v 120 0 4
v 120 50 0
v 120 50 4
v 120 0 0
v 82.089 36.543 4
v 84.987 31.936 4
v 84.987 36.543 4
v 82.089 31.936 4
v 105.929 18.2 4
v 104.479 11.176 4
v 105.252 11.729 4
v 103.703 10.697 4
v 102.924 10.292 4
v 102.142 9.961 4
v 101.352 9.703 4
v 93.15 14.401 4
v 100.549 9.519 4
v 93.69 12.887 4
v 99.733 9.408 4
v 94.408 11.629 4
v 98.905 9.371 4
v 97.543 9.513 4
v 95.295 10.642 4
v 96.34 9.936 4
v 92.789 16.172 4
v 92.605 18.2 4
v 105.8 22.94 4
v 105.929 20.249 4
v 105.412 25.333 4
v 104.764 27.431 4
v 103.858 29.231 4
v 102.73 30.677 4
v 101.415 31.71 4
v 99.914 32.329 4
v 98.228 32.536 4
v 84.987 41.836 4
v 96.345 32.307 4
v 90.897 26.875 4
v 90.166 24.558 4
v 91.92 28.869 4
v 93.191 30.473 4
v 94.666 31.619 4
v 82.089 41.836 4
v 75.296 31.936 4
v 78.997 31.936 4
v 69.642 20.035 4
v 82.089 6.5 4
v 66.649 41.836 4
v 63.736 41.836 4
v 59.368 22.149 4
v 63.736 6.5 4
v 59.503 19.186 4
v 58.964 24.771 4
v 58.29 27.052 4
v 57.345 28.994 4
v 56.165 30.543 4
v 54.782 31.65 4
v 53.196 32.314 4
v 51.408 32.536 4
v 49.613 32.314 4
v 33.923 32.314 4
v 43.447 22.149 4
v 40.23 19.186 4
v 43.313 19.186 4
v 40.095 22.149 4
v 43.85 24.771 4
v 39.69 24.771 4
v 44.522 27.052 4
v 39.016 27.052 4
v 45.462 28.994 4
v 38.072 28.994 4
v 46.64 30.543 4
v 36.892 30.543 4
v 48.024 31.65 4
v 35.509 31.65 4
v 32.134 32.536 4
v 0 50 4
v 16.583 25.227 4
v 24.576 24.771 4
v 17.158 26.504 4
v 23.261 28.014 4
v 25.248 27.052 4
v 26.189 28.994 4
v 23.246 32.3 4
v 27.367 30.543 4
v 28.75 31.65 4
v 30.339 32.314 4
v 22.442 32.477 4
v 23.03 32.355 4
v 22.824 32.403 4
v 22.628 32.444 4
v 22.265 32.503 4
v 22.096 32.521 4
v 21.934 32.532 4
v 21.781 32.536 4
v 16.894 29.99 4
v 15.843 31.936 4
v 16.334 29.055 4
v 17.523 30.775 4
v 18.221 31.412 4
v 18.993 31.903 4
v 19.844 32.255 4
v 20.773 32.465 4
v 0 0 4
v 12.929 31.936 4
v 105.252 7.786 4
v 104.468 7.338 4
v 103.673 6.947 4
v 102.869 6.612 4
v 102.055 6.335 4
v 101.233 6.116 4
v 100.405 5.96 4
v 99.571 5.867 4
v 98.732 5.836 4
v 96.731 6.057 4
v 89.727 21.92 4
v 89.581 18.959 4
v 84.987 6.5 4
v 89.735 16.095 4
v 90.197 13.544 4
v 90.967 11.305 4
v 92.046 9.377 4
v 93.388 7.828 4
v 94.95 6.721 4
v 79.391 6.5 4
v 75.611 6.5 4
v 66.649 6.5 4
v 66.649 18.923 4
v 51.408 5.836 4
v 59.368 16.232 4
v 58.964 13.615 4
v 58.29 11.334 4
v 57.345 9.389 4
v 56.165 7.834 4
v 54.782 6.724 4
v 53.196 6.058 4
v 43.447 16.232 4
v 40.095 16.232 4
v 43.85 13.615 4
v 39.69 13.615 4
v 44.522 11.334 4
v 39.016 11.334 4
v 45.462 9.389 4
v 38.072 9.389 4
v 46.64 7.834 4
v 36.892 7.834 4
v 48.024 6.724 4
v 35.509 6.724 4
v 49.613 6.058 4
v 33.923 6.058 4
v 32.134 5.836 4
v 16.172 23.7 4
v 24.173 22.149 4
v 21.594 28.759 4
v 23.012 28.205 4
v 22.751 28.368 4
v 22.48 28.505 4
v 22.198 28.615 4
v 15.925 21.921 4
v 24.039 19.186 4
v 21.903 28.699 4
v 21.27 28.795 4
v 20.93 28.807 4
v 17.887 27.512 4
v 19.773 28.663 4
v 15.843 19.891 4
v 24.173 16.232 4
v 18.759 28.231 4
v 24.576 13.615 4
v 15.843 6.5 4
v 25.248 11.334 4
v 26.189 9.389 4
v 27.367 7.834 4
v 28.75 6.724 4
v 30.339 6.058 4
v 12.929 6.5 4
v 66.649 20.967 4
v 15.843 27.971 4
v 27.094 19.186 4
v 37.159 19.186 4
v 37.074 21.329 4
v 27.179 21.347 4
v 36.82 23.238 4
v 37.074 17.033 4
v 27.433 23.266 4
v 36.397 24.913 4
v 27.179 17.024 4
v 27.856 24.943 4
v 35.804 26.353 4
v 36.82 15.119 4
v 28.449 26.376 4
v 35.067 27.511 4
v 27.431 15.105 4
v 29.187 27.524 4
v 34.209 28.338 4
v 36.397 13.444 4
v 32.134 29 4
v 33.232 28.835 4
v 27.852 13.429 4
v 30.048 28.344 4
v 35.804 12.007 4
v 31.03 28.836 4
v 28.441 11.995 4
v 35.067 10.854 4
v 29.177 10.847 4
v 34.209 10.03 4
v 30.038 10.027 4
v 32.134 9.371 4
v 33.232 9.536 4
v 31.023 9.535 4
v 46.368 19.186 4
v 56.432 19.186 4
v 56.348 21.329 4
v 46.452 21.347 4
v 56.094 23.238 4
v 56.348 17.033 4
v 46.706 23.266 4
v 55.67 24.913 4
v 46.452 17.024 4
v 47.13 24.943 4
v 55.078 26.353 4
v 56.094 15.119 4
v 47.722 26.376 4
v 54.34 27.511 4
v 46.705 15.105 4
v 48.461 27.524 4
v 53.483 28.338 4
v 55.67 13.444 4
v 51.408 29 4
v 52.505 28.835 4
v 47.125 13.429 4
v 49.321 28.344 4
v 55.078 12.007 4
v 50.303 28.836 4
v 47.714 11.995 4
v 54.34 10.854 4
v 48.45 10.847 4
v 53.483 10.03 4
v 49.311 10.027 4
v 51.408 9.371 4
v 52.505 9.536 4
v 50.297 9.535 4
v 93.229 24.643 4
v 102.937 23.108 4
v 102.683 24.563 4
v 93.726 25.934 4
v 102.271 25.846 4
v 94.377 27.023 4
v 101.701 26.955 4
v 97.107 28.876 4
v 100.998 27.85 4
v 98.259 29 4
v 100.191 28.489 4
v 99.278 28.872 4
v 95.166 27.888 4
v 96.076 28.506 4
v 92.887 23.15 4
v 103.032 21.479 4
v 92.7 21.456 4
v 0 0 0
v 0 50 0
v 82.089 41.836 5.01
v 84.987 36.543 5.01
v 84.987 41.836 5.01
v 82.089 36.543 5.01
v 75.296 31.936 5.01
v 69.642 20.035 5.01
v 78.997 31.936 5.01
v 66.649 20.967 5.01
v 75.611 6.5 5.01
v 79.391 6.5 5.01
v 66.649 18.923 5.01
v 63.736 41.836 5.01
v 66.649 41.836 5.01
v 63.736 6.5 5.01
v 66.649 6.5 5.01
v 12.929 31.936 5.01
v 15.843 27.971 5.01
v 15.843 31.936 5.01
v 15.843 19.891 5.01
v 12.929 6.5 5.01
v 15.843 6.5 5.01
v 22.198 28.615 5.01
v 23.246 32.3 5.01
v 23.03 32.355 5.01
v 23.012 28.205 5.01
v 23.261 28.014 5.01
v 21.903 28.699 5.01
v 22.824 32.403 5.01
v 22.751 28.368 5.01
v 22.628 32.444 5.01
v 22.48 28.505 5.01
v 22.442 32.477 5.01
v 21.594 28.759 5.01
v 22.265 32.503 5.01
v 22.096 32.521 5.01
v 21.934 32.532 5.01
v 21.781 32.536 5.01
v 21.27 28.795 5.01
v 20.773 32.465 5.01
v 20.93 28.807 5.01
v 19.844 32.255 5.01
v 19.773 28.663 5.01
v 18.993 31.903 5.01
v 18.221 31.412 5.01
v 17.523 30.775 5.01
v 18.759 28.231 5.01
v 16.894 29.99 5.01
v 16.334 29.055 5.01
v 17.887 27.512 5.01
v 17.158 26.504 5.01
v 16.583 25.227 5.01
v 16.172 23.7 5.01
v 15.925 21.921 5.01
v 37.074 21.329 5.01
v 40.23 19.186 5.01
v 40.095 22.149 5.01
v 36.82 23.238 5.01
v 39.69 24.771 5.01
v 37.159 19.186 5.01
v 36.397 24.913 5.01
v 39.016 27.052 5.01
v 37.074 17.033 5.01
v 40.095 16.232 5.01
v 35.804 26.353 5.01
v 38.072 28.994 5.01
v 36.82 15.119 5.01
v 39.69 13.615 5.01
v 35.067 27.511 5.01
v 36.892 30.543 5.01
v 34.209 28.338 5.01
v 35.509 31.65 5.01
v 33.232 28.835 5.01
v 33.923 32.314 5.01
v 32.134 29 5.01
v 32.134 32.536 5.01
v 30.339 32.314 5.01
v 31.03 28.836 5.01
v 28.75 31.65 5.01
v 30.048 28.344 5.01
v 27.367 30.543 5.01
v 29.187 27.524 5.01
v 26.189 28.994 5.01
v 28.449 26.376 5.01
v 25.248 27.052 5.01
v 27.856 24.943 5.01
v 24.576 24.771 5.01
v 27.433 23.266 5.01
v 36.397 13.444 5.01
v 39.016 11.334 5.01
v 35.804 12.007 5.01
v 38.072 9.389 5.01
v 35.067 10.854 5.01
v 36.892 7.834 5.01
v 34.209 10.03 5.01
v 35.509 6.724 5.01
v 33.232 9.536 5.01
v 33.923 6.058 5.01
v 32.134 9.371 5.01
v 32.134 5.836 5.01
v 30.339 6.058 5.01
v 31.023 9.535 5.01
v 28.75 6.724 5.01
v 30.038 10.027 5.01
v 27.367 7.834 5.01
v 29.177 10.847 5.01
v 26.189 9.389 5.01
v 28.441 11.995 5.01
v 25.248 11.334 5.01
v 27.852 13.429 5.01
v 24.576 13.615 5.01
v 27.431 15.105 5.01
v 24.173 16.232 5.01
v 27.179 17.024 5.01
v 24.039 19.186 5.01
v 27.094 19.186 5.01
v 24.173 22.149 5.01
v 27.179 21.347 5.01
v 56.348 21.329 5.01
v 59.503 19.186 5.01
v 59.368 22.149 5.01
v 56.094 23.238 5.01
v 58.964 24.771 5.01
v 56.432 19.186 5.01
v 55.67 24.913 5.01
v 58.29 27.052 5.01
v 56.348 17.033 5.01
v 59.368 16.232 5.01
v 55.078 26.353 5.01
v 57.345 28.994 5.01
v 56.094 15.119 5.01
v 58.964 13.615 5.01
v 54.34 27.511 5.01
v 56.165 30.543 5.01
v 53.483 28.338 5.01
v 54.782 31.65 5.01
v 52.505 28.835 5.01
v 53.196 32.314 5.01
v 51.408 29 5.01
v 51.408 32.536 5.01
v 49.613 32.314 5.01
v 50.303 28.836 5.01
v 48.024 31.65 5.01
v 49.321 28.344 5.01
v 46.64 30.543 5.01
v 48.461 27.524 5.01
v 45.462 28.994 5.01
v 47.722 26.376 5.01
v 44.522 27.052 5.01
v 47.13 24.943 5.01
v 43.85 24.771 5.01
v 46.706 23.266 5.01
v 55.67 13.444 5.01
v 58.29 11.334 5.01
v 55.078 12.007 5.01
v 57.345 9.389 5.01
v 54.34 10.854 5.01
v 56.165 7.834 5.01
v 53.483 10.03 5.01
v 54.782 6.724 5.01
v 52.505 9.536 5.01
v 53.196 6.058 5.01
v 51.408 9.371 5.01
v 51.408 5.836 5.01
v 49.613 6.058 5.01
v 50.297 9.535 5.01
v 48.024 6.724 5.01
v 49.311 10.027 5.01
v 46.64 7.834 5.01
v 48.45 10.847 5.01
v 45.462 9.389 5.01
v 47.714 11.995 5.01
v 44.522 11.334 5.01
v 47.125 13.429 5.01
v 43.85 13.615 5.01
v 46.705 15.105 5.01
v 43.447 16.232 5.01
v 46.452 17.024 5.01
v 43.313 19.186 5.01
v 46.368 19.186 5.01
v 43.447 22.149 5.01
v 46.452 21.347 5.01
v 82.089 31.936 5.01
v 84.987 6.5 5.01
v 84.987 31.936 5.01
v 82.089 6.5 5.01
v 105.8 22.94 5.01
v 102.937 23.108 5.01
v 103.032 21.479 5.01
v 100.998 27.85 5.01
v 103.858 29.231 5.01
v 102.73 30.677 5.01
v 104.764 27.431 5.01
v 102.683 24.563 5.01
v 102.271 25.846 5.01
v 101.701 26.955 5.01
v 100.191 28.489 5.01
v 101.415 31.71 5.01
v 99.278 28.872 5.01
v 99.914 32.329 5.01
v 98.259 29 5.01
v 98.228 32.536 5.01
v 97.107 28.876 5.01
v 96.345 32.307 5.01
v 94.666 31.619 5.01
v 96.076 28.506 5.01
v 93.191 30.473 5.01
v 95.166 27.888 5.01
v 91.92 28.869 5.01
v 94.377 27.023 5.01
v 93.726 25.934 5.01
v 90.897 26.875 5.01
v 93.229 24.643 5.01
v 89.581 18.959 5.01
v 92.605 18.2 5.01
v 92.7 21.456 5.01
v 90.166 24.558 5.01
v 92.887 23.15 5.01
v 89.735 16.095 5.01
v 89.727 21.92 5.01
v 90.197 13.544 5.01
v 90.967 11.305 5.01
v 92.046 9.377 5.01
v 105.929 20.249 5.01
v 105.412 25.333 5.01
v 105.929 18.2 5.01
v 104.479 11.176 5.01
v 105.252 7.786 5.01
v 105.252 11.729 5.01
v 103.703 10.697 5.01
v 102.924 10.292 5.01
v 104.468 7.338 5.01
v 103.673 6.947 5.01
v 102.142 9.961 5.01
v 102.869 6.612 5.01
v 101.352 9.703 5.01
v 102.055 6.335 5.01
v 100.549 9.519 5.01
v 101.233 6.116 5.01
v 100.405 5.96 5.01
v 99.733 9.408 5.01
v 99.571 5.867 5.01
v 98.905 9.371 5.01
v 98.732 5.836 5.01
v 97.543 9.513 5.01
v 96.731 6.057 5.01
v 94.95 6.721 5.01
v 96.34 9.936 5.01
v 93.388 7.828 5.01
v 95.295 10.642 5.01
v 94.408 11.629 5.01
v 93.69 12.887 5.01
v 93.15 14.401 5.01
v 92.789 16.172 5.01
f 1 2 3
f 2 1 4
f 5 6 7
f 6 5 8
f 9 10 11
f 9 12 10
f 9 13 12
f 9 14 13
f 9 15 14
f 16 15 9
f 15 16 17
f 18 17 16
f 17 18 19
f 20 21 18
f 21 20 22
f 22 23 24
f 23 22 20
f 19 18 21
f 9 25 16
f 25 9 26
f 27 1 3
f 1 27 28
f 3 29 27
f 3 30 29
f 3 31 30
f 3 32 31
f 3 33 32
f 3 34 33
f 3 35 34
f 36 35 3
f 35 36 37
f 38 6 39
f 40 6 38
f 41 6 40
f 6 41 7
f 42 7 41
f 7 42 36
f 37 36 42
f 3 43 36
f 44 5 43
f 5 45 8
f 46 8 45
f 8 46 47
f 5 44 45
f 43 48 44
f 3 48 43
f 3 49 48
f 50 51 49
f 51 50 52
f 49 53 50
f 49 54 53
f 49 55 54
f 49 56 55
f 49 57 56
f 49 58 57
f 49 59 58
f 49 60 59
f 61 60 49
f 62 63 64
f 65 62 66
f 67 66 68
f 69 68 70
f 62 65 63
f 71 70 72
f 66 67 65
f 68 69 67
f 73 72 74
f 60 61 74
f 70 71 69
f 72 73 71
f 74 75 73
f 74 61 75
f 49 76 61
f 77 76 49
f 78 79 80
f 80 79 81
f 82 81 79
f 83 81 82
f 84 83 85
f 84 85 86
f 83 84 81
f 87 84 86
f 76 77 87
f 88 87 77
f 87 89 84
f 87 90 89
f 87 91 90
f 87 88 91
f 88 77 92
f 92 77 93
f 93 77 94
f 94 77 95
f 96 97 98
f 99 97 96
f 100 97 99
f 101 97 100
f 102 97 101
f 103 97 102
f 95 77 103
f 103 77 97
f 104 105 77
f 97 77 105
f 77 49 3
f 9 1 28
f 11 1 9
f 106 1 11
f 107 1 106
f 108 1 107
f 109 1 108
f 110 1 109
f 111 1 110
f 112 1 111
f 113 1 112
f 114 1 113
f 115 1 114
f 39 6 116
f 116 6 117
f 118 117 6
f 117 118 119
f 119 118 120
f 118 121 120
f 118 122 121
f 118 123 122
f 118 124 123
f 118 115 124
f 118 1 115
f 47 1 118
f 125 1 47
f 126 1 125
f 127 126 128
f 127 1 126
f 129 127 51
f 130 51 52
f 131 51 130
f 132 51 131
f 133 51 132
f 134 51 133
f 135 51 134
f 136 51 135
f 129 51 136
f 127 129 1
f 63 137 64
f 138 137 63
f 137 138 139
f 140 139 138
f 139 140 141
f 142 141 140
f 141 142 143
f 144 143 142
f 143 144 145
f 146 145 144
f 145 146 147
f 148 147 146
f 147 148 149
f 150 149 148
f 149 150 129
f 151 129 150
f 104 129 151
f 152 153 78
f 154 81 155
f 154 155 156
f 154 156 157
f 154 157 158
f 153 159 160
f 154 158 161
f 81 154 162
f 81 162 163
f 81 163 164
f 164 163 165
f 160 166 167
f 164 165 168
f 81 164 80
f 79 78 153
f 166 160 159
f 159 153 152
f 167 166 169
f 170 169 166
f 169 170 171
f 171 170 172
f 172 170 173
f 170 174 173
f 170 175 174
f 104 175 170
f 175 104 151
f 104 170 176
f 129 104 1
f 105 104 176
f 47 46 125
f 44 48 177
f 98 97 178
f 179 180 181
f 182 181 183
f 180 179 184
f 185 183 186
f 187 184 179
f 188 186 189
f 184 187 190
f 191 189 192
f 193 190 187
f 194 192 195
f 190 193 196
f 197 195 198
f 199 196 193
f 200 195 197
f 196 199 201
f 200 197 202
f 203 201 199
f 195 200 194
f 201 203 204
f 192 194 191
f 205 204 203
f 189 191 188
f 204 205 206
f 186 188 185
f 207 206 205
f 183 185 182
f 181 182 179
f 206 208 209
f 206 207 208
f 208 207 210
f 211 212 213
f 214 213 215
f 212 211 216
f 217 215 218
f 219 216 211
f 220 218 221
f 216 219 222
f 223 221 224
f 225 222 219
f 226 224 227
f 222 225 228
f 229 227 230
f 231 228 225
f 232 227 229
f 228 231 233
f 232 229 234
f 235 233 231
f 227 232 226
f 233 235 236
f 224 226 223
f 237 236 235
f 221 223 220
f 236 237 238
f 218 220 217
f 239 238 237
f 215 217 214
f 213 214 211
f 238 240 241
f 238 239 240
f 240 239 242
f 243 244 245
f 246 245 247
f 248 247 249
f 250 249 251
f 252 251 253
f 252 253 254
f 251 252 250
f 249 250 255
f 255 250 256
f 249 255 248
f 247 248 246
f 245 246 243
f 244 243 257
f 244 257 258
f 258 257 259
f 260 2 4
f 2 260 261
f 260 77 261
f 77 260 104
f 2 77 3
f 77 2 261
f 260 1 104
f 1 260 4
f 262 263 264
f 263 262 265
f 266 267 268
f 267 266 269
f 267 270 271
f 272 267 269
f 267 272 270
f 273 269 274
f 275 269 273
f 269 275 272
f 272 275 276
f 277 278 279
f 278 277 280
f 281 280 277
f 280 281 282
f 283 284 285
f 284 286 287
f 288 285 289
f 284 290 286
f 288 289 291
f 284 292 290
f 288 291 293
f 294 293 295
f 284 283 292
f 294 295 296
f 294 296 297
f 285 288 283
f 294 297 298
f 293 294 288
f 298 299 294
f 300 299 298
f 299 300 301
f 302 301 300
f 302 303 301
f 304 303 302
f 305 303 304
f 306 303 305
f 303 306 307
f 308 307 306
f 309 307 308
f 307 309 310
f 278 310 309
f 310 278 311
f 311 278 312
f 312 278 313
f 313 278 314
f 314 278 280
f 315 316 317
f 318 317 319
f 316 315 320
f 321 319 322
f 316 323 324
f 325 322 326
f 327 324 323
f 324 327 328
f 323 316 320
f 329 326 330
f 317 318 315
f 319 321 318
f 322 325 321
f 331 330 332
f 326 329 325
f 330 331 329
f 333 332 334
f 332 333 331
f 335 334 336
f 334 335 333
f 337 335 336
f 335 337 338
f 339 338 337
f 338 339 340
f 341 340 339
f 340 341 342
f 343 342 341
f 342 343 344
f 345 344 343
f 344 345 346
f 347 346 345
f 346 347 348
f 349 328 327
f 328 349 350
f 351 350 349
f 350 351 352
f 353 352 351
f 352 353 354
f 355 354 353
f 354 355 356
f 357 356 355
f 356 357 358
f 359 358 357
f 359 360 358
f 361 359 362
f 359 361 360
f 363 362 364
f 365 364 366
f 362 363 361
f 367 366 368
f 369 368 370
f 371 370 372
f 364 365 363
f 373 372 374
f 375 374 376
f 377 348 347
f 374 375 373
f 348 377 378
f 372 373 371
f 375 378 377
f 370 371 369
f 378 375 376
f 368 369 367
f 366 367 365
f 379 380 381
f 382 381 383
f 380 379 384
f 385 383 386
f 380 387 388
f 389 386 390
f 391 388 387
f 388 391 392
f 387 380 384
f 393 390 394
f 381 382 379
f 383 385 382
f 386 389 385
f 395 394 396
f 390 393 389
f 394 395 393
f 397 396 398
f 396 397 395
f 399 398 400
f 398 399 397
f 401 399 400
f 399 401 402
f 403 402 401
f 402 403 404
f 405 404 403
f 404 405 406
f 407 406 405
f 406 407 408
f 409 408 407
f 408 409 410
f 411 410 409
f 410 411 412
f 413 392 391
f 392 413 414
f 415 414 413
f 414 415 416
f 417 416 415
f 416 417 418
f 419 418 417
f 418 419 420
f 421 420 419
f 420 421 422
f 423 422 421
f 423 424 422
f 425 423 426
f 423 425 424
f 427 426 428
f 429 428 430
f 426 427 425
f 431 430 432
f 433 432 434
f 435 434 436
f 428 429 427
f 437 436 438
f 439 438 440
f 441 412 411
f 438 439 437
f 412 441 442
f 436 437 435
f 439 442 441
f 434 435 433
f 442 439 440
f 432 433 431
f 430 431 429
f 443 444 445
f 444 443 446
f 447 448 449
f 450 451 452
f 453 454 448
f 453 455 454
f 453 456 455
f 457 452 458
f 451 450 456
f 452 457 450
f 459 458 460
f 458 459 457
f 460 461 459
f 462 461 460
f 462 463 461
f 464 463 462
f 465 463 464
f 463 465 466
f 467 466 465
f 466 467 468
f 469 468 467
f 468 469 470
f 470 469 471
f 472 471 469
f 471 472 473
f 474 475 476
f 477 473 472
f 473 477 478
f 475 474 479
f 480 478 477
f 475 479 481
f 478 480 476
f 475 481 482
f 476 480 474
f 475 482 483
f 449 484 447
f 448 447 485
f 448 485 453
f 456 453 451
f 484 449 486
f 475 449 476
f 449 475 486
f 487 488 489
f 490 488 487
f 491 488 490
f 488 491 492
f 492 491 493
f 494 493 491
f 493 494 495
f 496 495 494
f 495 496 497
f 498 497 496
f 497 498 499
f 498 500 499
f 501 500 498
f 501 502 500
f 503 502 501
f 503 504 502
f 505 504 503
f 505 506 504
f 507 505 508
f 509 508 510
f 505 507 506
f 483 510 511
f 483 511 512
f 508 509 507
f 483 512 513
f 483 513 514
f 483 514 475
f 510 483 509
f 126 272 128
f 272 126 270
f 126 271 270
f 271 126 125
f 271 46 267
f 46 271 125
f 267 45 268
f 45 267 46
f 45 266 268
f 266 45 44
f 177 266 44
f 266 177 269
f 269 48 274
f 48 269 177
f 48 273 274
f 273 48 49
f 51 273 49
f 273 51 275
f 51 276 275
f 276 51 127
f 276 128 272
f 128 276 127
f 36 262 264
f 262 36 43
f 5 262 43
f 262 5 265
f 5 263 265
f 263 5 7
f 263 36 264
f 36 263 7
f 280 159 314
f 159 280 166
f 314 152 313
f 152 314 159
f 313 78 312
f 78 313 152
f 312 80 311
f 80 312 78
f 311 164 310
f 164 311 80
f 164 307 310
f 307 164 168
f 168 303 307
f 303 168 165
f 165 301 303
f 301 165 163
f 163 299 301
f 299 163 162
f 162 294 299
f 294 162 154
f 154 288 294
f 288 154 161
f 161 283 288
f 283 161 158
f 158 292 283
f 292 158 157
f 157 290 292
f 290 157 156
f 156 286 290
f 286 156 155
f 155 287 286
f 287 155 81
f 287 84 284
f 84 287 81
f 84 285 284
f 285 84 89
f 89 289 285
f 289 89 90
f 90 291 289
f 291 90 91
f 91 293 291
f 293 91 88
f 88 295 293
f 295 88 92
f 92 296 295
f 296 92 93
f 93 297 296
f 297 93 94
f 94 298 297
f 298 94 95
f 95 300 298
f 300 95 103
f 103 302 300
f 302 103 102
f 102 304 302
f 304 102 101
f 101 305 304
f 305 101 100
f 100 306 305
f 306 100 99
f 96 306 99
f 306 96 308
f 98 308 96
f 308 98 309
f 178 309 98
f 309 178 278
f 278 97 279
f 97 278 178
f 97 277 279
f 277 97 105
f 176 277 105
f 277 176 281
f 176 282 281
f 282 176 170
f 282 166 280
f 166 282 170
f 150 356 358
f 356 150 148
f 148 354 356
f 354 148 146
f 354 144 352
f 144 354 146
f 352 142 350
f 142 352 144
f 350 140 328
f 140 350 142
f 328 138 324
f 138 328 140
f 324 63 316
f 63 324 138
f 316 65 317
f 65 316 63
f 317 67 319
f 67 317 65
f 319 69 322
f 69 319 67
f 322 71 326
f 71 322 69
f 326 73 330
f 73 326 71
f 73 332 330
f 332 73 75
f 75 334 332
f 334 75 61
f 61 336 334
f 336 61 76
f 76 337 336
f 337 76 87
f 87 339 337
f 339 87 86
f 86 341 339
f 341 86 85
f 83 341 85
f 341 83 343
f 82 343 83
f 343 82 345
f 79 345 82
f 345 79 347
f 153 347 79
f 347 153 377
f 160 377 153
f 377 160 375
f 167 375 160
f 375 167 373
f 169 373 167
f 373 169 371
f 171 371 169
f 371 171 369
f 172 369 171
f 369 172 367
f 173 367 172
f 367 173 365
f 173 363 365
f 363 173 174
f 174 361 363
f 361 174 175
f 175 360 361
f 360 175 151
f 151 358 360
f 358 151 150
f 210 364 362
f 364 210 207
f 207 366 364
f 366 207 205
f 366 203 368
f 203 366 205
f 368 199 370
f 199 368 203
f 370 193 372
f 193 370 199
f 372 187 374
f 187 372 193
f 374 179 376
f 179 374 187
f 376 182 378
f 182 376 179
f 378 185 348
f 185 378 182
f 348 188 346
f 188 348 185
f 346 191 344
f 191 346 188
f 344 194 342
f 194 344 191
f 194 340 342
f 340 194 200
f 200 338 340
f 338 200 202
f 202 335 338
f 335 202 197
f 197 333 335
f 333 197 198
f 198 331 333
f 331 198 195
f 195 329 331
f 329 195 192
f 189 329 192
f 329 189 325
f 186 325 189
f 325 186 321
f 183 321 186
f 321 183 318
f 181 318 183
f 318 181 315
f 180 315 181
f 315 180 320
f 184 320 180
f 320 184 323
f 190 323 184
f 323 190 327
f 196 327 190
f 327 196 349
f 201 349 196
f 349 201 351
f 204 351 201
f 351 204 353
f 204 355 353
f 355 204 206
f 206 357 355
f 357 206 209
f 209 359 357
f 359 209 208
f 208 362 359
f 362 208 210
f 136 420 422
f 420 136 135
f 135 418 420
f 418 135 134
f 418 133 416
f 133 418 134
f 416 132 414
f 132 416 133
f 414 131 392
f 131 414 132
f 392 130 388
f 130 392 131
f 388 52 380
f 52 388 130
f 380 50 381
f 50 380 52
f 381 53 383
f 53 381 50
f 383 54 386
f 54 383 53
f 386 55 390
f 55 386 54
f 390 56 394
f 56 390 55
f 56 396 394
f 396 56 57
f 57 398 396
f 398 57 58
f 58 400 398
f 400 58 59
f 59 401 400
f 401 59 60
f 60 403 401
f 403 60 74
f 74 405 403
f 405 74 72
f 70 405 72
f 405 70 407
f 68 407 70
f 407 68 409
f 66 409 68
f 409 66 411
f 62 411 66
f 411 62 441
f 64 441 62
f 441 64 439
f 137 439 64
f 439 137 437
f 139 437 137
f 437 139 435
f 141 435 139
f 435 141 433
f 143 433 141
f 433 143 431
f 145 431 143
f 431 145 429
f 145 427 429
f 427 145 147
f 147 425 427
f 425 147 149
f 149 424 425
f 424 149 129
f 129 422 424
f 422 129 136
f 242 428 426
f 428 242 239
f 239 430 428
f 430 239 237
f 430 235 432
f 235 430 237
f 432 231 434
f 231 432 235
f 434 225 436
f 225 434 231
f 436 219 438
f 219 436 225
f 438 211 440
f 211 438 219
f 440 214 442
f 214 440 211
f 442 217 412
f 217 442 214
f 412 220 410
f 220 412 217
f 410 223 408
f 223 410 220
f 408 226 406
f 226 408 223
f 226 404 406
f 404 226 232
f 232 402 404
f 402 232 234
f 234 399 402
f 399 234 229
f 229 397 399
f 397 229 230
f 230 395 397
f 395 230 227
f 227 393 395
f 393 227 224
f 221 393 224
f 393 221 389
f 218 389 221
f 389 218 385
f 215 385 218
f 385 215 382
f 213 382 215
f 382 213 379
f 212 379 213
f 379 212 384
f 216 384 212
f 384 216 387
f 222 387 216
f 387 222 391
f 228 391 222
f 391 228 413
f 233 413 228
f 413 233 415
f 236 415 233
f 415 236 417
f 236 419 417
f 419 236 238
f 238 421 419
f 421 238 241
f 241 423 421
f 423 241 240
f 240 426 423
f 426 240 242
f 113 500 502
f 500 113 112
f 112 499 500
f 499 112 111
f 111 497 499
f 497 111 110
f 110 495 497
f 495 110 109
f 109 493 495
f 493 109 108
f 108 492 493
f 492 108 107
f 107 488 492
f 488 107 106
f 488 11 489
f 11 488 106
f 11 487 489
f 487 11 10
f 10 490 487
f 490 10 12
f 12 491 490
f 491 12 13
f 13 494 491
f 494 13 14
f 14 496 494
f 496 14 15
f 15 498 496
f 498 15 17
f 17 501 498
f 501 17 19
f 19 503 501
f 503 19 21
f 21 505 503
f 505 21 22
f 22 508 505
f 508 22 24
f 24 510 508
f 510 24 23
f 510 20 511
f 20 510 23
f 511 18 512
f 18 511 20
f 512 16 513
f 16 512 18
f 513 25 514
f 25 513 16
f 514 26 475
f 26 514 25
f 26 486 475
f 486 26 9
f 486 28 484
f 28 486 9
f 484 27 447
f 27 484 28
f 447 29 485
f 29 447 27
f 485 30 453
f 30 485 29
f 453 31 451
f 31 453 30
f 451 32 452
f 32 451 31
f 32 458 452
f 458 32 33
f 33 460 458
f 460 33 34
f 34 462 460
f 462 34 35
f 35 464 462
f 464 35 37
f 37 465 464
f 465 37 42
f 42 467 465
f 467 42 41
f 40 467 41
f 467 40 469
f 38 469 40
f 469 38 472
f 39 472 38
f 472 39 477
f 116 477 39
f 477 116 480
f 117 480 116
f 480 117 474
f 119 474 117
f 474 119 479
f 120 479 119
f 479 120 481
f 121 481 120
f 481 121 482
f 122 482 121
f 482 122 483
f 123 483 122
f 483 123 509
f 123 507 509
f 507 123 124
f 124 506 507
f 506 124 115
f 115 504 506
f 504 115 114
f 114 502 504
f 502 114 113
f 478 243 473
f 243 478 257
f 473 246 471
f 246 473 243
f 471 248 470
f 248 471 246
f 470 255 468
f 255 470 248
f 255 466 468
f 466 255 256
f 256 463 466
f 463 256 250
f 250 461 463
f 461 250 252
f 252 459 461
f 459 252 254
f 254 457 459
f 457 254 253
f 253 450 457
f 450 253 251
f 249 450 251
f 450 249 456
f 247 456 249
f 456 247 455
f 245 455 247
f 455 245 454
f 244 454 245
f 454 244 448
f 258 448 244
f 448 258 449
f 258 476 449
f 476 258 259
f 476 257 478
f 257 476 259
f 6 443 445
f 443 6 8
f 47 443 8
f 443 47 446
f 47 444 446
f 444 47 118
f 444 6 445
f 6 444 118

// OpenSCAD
color("black")
cube([120, 50, 4]);

color("red")
translate([10,6.5,0.01])
linear_extrude(height=5)
resize([93,36,0])
text(
    text="rookie",
    font="Ghostbusters Nametag"
);
